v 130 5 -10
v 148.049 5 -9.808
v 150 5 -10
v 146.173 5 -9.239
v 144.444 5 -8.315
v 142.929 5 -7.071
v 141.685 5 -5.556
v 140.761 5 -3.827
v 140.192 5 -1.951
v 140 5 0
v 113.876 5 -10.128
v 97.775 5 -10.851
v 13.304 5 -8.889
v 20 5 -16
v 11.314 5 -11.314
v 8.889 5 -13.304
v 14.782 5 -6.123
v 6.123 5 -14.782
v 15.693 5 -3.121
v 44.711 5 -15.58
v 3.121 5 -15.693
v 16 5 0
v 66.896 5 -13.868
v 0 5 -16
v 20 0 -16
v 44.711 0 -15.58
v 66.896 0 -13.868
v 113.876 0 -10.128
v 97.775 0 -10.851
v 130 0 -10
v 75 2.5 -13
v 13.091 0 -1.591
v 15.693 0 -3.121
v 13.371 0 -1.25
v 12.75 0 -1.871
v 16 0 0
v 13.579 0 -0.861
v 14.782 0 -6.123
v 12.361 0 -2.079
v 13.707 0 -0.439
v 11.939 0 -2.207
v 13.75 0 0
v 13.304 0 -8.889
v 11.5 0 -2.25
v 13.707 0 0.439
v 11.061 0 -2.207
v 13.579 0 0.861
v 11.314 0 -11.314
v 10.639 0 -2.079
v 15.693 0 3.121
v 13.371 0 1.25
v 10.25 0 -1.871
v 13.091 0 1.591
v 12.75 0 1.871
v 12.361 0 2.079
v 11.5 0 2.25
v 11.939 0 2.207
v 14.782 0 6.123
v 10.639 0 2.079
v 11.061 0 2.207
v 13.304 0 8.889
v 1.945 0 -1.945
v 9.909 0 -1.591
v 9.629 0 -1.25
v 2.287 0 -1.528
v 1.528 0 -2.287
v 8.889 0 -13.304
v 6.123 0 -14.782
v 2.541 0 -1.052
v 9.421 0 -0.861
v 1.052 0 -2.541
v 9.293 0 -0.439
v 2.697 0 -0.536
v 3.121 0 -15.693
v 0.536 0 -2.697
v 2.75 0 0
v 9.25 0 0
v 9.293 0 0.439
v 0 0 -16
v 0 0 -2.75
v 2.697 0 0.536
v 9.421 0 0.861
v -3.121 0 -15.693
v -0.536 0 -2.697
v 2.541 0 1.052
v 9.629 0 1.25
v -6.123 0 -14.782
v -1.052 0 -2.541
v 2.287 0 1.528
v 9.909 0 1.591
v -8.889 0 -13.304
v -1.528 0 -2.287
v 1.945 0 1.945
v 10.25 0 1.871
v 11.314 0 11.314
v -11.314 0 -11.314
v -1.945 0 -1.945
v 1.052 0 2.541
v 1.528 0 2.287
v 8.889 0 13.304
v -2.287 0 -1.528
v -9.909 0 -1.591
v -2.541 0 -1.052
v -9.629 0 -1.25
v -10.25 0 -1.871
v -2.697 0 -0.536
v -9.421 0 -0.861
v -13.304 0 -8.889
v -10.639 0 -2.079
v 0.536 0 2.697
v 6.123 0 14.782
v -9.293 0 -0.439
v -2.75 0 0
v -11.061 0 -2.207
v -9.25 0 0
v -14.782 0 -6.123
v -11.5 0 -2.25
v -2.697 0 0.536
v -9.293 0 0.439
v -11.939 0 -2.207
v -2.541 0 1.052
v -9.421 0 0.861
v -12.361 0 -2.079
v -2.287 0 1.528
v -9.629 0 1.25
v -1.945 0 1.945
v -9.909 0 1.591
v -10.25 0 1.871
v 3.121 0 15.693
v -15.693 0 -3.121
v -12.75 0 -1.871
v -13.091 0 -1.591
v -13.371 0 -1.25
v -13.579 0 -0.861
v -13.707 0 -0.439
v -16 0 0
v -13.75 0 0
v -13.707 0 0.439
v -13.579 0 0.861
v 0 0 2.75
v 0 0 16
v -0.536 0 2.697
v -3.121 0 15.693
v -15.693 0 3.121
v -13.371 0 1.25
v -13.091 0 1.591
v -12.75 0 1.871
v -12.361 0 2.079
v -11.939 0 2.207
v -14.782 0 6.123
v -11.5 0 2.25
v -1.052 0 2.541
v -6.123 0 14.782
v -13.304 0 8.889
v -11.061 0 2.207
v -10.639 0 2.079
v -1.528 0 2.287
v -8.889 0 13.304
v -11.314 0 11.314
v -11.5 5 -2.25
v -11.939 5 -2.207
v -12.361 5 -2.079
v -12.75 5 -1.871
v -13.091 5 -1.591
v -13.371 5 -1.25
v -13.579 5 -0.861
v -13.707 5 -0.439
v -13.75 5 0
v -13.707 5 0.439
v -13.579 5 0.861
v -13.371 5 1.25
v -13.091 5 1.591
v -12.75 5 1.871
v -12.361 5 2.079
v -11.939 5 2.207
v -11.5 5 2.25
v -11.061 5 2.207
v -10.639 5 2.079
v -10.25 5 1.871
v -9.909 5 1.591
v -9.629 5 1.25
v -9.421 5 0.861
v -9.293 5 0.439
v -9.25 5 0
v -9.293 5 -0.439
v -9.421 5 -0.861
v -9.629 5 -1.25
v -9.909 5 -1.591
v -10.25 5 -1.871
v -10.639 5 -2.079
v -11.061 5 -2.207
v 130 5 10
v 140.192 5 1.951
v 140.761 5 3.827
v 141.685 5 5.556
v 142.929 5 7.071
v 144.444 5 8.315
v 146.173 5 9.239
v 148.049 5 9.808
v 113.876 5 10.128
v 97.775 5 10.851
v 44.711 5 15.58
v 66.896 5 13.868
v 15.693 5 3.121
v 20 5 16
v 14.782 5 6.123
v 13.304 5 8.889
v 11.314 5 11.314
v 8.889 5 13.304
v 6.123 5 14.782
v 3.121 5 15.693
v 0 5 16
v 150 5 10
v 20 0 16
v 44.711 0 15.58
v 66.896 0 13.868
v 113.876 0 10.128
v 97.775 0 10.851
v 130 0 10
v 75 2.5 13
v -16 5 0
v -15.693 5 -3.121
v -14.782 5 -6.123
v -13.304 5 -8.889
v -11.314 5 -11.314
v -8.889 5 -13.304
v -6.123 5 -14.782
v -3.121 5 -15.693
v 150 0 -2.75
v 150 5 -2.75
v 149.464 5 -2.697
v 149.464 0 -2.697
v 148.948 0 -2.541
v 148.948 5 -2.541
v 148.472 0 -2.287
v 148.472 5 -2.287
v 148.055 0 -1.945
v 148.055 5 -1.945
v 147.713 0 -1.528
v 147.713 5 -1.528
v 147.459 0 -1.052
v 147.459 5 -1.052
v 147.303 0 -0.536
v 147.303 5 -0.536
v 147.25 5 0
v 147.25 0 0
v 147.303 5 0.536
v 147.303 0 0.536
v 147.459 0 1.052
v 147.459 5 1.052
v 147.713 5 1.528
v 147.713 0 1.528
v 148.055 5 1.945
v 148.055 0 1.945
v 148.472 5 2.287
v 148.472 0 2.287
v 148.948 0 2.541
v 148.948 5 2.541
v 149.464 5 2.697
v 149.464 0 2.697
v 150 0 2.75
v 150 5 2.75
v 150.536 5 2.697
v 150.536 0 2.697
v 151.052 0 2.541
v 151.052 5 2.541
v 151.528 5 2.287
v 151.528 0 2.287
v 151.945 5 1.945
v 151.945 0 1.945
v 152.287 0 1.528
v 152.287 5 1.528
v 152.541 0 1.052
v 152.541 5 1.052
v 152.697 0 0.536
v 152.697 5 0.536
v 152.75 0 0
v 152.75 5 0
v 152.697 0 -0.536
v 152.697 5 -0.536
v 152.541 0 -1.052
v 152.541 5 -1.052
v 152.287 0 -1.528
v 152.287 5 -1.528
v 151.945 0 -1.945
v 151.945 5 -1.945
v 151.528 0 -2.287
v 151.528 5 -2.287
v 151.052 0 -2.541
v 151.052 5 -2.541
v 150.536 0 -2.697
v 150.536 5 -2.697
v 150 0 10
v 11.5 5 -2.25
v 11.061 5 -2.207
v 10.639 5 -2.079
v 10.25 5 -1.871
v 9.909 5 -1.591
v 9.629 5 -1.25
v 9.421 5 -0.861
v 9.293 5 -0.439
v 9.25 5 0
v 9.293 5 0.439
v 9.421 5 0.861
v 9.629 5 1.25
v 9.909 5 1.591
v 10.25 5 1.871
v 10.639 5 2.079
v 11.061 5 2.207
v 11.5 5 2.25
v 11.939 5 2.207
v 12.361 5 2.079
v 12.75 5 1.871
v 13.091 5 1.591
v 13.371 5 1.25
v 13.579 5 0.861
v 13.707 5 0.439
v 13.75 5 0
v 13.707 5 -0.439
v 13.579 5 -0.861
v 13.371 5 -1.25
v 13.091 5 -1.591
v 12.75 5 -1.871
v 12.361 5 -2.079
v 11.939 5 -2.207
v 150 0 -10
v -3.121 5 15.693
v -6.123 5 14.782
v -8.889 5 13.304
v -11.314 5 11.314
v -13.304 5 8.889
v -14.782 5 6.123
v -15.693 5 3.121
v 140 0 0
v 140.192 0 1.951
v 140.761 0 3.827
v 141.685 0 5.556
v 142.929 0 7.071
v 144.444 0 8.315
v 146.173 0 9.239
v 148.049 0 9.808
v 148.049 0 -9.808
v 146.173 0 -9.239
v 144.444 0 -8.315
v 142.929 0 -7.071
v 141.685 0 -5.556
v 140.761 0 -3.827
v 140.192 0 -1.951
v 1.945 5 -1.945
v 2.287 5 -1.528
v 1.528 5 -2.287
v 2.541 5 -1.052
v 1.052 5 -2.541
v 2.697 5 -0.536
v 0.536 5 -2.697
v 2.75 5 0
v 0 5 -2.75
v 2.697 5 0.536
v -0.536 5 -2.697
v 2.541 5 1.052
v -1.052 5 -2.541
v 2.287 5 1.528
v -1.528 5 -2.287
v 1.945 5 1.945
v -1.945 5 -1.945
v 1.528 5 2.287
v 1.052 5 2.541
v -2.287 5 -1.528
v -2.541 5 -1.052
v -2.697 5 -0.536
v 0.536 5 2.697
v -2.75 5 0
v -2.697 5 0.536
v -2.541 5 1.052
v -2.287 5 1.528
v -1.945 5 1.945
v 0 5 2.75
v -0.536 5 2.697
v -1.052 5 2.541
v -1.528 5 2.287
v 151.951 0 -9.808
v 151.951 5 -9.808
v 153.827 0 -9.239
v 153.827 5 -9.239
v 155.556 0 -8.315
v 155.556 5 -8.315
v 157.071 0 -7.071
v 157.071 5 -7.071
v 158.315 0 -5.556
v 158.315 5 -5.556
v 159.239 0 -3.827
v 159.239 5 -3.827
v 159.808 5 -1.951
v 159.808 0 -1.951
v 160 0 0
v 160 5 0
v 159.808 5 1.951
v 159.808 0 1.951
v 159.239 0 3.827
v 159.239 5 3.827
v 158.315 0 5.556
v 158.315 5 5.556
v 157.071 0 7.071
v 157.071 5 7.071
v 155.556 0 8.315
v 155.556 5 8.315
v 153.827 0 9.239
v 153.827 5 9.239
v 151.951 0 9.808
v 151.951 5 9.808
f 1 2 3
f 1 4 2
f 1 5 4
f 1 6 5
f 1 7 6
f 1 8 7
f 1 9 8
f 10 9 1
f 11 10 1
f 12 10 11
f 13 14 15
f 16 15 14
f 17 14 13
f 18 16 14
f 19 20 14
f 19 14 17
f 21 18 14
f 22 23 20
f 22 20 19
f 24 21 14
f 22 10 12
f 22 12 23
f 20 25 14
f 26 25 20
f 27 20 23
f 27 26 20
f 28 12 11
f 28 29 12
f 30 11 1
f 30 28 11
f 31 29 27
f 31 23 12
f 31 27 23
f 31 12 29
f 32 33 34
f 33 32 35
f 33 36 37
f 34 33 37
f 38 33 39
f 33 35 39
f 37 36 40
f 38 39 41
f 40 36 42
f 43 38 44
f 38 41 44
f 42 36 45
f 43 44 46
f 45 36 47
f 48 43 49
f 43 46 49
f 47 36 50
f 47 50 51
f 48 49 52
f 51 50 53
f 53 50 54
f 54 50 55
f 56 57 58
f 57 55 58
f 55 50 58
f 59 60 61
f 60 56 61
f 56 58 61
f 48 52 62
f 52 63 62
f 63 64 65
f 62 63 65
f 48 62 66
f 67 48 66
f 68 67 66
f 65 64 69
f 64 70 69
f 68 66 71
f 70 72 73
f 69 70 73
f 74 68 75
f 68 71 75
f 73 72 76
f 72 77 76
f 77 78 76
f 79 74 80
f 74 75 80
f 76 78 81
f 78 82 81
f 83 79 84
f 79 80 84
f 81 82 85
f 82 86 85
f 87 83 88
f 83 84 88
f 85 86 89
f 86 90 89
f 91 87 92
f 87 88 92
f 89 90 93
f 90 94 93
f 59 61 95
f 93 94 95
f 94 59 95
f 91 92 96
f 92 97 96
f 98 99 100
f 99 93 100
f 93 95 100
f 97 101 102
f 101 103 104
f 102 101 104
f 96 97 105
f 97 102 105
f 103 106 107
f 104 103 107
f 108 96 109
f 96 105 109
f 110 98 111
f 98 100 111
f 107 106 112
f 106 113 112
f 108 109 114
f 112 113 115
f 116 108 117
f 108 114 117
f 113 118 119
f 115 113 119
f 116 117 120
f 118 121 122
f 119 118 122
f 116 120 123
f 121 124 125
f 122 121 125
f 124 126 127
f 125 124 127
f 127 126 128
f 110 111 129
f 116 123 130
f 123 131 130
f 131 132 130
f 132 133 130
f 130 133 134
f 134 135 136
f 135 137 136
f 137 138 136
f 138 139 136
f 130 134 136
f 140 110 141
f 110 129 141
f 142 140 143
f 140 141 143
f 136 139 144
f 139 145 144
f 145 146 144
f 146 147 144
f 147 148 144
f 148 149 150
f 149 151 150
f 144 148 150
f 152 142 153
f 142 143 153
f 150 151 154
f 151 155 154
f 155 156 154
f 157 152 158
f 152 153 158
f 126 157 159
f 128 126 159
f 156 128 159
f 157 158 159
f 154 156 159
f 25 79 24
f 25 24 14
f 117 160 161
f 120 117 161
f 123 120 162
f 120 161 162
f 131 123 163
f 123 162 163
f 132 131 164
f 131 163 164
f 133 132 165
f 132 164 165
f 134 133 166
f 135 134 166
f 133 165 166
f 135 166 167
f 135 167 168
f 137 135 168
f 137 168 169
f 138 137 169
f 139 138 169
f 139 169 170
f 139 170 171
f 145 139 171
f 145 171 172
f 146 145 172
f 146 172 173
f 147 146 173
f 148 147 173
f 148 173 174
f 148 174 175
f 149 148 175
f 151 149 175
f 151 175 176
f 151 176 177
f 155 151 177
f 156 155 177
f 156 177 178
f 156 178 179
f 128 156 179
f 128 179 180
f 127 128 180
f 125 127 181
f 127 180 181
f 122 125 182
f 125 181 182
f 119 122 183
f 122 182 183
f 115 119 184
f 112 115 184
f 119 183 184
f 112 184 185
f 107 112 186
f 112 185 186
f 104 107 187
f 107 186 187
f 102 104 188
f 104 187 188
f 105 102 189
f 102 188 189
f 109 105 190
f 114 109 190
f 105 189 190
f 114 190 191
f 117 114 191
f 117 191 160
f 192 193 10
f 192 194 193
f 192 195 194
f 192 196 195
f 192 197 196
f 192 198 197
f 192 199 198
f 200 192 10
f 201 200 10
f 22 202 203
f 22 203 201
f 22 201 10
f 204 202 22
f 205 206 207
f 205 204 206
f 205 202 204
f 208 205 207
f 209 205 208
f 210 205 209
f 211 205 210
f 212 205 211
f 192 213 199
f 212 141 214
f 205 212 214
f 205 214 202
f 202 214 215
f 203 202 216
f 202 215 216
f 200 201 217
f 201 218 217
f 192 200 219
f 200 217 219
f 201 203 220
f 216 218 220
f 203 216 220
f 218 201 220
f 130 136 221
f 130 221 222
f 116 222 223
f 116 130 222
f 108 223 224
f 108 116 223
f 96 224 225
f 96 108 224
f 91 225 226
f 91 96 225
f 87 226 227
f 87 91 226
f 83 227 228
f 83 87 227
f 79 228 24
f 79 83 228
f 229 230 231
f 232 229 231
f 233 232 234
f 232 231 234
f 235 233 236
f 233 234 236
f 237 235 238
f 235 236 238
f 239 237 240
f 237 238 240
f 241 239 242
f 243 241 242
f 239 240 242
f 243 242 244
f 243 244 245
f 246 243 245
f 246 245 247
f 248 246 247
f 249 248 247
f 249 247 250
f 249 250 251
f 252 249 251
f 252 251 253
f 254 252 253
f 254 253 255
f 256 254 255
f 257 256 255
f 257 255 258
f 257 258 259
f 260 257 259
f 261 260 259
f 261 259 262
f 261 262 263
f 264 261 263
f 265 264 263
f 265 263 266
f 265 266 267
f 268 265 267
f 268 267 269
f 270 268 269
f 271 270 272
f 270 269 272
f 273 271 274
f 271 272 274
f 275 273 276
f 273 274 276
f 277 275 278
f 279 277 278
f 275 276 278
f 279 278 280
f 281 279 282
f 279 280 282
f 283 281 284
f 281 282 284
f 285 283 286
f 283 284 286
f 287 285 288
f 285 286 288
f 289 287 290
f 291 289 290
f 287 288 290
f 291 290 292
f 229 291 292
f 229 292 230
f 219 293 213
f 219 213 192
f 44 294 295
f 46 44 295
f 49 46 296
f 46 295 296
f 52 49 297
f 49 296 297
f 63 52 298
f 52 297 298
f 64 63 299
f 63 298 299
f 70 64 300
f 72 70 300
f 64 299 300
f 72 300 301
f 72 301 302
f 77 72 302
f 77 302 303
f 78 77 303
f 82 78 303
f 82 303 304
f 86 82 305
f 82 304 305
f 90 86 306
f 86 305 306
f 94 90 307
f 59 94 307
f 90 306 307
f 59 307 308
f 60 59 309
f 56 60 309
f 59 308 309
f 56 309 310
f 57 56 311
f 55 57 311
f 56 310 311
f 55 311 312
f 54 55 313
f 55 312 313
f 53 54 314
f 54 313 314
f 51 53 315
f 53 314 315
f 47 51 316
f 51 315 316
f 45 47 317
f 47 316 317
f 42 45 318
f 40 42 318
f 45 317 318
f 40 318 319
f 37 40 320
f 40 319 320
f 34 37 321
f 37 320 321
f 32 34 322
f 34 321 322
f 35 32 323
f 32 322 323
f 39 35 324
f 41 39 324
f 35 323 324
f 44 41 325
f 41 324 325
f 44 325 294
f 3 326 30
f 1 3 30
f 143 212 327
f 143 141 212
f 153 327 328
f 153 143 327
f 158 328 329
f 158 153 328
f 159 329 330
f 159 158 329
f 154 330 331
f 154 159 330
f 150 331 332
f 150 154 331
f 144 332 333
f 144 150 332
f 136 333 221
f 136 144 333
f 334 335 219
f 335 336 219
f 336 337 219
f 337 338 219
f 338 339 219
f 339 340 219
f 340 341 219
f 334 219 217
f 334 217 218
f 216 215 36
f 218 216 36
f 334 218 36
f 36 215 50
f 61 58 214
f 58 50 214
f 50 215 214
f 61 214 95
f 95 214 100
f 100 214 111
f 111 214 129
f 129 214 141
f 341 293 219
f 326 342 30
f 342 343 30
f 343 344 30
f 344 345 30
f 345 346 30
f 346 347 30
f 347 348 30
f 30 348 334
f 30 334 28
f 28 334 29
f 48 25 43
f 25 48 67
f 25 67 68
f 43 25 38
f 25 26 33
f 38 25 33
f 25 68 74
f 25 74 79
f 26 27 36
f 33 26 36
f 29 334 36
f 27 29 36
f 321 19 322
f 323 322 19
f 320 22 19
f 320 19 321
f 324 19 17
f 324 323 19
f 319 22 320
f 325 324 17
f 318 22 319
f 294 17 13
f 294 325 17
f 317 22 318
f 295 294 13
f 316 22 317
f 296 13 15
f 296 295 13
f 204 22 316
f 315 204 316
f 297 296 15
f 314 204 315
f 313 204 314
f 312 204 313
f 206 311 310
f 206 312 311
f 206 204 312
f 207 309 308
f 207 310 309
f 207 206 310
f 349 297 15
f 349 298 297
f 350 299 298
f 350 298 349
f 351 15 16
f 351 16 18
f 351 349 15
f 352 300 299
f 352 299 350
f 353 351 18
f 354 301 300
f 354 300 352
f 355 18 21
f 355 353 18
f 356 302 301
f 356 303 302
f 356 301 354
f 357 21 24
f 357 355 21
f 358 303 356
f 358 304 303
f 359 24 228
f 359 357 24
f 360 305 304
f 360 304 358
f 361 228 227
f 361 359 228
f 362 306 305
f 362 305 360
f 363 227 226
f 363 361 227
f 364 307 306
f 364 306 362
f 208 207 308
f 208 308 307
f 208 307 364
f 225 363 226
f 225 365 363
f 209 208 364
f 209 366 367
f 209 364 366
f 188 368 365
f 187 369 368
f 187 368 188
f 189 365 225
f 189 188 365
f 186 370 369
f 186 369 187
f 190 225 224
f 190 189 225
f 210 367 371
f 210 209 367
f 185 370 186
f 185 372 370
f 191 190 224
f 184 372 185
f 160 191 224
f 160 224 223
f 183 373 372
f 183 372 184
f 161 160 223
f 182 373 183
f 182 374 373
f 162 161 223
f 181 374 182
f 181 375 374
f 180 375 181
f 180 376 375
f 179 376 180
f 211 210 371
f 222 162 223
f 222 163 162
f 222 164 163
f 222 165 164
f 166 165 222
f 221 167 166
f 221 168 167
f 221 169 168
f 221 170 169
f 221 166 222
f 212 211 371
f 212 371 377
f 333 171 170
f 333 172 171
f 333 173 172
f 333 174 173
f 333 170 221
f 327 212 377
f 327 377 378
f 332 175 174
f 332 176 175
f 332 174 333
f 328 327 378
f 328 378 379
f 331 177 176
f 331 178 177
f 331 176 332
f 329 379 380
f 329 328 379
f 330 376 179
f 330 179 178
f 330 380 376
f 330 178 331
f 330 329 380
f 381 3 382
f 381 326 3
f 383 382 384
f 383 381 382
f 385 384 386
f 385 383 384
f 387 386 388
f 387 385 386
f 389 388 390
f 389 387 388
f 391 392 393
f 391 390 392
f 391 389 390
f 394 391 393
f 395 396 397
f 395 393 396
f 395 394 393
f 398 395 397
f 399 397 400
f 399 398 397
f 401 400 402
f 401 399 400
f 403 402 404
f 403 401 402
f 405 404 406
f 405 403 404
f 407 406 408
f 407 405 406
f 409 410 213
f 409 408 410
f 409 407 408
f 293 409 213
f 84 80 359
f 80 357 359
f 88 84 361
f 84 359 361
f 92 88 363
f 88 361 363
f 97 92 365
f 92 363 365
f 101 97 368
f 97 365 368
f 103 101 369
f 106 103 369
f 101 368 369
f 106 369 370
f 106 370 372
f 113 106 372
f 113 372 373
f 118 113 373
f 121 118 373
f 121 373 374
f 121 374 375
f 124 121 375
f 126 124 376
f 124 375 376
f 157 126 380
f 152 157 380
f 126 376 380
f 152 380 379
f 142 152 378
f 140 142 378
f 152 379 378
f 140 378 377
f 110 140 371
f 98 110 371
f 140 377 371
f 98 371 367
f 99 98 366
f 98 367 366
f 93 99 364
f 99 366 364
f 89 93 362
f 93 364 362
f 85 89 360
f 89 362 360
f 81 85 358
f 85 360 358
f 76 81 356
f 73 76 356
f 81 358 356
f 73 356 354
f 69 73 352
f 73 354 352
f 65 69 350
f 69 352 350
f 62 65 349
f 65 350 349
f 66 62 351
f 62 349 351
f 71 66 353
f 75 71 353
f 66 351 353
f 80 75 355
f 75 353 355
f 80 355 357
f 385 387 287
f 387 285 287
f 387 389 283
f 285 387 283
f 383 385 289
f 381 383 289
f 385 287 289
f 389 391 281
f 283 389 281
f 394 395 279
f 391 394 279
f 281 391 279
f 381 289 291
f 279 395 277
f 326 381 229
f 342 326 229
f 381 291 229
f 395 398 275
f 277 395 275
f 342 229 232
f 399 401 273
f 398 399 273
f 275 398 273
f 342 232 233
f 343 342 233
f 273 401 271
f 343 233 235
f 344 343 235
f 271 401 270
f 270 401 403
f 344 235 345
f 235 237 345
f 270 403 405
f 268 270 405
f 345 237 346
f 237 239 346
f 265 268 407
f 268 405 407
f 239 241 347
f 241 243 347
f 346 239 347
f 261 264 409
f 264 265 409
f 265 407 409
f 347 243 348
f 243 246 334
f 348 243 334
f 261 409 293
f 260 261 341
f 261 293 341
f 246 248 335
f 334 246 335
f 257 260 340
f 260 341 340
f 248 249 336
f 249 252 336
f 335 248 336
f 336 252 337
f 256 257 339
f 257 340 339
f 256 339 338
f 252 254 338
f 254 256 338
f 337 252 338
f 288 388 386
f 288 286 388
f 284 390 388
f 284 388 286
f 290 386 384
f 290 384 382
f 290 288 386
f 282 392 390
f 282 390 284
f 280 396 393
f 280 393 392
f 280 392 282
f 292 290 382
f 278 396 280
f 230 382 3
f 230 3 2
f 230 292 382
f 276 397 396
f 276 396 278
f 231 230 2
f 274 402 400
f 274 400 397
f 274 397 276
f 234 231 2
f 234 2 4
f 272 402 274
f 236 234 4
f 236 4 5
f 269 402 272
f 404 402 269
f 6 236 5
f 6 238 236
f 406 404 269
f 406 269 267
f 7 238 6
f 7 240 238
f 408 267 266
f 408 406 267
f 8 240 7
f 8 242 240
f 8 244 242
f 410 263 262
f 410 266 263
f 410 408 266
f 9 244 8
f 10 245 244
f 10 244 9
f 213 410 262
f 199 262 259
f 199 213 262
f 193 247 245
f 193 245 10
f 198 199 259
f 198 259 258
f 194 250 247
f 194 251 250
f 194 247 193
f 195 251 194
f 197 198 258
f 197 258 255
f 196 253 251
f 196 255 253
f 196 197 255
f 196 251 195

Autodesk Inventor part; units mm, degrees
ref_plane "YZ Plane" through (0, 0, 0) normal (1, 0, 0) x (0, 1, 0)
ref_plane "XZ Plane" through (0, 0, 0) normal (0, 1, 0) x (-1, 0, 0)
ref_plane "XY Plane" through (0, 0, 0) normal (0, 0, 1) x (1, 0, 0)
sketch "Sketch2" plane through (0, 0, 0) normal (0, 1, 0) x (-1, 0, 0)
  circle A0 centre (0, 0) radius 16
  circle A1 centre (-150, 0) radius 10
  line L0 (0, 0) -> (-150, 0)
  line L1 (0, 16) -> (-20, 16)
  line L2 (-150, 10) -> (-130, 10)
  spline S0 degree 4 poles (-20, 16) (-33.7807, 16) (-61.342, 16) (-88.658, 10) (-116.2193, 10) (-130, 10) knots 0 0 0 0 0 0.5 1 1 1 1 1
  line L3 (0, 0) -> (0, 16) construction
  line L4 (-150, 0) -> (-150, 10) construction
  line L5 (0, -16) -> (-20, -16)
  line L6 (-150, -10) -> (-130, -10)
  spline S1 degree 4 poles (-20, -16) (-33.7807, -16) (-61.342, -16) (-88.658, -10) (-116.2193, -10) (-130, -10) knots 0 0 0 0 0 0.5 1 1 1 1 1
  line L7 (11.5, 0) -> (-11.5, 0) construction
  dimension "d0" = 32
  dimension "d1" = 20
  dimension "d2" = 150
  dimension "d3" = 20
  dimension "d4" = 20
  dimension "d5" = 23
extrude "Extrusion1" add sketch "Sketch2" along normal blind 5
hole "Hole1" at (-11.5, 0, 0) at (11.5, 0, 0) direction (0, 1, 0) diameter 4.5 end through all clearance for "Socket Head Cap Screw" size "M4" standard "Ansi Metric M Profile"
hole "Hole2" at (150, 0, 0) at (0, 0, 0) direction (0, 1, 0) diameter 5.5 end through all clearance for "Socket Head Cap Screw" size "M5" standard "Ansi Metric M Profile"
